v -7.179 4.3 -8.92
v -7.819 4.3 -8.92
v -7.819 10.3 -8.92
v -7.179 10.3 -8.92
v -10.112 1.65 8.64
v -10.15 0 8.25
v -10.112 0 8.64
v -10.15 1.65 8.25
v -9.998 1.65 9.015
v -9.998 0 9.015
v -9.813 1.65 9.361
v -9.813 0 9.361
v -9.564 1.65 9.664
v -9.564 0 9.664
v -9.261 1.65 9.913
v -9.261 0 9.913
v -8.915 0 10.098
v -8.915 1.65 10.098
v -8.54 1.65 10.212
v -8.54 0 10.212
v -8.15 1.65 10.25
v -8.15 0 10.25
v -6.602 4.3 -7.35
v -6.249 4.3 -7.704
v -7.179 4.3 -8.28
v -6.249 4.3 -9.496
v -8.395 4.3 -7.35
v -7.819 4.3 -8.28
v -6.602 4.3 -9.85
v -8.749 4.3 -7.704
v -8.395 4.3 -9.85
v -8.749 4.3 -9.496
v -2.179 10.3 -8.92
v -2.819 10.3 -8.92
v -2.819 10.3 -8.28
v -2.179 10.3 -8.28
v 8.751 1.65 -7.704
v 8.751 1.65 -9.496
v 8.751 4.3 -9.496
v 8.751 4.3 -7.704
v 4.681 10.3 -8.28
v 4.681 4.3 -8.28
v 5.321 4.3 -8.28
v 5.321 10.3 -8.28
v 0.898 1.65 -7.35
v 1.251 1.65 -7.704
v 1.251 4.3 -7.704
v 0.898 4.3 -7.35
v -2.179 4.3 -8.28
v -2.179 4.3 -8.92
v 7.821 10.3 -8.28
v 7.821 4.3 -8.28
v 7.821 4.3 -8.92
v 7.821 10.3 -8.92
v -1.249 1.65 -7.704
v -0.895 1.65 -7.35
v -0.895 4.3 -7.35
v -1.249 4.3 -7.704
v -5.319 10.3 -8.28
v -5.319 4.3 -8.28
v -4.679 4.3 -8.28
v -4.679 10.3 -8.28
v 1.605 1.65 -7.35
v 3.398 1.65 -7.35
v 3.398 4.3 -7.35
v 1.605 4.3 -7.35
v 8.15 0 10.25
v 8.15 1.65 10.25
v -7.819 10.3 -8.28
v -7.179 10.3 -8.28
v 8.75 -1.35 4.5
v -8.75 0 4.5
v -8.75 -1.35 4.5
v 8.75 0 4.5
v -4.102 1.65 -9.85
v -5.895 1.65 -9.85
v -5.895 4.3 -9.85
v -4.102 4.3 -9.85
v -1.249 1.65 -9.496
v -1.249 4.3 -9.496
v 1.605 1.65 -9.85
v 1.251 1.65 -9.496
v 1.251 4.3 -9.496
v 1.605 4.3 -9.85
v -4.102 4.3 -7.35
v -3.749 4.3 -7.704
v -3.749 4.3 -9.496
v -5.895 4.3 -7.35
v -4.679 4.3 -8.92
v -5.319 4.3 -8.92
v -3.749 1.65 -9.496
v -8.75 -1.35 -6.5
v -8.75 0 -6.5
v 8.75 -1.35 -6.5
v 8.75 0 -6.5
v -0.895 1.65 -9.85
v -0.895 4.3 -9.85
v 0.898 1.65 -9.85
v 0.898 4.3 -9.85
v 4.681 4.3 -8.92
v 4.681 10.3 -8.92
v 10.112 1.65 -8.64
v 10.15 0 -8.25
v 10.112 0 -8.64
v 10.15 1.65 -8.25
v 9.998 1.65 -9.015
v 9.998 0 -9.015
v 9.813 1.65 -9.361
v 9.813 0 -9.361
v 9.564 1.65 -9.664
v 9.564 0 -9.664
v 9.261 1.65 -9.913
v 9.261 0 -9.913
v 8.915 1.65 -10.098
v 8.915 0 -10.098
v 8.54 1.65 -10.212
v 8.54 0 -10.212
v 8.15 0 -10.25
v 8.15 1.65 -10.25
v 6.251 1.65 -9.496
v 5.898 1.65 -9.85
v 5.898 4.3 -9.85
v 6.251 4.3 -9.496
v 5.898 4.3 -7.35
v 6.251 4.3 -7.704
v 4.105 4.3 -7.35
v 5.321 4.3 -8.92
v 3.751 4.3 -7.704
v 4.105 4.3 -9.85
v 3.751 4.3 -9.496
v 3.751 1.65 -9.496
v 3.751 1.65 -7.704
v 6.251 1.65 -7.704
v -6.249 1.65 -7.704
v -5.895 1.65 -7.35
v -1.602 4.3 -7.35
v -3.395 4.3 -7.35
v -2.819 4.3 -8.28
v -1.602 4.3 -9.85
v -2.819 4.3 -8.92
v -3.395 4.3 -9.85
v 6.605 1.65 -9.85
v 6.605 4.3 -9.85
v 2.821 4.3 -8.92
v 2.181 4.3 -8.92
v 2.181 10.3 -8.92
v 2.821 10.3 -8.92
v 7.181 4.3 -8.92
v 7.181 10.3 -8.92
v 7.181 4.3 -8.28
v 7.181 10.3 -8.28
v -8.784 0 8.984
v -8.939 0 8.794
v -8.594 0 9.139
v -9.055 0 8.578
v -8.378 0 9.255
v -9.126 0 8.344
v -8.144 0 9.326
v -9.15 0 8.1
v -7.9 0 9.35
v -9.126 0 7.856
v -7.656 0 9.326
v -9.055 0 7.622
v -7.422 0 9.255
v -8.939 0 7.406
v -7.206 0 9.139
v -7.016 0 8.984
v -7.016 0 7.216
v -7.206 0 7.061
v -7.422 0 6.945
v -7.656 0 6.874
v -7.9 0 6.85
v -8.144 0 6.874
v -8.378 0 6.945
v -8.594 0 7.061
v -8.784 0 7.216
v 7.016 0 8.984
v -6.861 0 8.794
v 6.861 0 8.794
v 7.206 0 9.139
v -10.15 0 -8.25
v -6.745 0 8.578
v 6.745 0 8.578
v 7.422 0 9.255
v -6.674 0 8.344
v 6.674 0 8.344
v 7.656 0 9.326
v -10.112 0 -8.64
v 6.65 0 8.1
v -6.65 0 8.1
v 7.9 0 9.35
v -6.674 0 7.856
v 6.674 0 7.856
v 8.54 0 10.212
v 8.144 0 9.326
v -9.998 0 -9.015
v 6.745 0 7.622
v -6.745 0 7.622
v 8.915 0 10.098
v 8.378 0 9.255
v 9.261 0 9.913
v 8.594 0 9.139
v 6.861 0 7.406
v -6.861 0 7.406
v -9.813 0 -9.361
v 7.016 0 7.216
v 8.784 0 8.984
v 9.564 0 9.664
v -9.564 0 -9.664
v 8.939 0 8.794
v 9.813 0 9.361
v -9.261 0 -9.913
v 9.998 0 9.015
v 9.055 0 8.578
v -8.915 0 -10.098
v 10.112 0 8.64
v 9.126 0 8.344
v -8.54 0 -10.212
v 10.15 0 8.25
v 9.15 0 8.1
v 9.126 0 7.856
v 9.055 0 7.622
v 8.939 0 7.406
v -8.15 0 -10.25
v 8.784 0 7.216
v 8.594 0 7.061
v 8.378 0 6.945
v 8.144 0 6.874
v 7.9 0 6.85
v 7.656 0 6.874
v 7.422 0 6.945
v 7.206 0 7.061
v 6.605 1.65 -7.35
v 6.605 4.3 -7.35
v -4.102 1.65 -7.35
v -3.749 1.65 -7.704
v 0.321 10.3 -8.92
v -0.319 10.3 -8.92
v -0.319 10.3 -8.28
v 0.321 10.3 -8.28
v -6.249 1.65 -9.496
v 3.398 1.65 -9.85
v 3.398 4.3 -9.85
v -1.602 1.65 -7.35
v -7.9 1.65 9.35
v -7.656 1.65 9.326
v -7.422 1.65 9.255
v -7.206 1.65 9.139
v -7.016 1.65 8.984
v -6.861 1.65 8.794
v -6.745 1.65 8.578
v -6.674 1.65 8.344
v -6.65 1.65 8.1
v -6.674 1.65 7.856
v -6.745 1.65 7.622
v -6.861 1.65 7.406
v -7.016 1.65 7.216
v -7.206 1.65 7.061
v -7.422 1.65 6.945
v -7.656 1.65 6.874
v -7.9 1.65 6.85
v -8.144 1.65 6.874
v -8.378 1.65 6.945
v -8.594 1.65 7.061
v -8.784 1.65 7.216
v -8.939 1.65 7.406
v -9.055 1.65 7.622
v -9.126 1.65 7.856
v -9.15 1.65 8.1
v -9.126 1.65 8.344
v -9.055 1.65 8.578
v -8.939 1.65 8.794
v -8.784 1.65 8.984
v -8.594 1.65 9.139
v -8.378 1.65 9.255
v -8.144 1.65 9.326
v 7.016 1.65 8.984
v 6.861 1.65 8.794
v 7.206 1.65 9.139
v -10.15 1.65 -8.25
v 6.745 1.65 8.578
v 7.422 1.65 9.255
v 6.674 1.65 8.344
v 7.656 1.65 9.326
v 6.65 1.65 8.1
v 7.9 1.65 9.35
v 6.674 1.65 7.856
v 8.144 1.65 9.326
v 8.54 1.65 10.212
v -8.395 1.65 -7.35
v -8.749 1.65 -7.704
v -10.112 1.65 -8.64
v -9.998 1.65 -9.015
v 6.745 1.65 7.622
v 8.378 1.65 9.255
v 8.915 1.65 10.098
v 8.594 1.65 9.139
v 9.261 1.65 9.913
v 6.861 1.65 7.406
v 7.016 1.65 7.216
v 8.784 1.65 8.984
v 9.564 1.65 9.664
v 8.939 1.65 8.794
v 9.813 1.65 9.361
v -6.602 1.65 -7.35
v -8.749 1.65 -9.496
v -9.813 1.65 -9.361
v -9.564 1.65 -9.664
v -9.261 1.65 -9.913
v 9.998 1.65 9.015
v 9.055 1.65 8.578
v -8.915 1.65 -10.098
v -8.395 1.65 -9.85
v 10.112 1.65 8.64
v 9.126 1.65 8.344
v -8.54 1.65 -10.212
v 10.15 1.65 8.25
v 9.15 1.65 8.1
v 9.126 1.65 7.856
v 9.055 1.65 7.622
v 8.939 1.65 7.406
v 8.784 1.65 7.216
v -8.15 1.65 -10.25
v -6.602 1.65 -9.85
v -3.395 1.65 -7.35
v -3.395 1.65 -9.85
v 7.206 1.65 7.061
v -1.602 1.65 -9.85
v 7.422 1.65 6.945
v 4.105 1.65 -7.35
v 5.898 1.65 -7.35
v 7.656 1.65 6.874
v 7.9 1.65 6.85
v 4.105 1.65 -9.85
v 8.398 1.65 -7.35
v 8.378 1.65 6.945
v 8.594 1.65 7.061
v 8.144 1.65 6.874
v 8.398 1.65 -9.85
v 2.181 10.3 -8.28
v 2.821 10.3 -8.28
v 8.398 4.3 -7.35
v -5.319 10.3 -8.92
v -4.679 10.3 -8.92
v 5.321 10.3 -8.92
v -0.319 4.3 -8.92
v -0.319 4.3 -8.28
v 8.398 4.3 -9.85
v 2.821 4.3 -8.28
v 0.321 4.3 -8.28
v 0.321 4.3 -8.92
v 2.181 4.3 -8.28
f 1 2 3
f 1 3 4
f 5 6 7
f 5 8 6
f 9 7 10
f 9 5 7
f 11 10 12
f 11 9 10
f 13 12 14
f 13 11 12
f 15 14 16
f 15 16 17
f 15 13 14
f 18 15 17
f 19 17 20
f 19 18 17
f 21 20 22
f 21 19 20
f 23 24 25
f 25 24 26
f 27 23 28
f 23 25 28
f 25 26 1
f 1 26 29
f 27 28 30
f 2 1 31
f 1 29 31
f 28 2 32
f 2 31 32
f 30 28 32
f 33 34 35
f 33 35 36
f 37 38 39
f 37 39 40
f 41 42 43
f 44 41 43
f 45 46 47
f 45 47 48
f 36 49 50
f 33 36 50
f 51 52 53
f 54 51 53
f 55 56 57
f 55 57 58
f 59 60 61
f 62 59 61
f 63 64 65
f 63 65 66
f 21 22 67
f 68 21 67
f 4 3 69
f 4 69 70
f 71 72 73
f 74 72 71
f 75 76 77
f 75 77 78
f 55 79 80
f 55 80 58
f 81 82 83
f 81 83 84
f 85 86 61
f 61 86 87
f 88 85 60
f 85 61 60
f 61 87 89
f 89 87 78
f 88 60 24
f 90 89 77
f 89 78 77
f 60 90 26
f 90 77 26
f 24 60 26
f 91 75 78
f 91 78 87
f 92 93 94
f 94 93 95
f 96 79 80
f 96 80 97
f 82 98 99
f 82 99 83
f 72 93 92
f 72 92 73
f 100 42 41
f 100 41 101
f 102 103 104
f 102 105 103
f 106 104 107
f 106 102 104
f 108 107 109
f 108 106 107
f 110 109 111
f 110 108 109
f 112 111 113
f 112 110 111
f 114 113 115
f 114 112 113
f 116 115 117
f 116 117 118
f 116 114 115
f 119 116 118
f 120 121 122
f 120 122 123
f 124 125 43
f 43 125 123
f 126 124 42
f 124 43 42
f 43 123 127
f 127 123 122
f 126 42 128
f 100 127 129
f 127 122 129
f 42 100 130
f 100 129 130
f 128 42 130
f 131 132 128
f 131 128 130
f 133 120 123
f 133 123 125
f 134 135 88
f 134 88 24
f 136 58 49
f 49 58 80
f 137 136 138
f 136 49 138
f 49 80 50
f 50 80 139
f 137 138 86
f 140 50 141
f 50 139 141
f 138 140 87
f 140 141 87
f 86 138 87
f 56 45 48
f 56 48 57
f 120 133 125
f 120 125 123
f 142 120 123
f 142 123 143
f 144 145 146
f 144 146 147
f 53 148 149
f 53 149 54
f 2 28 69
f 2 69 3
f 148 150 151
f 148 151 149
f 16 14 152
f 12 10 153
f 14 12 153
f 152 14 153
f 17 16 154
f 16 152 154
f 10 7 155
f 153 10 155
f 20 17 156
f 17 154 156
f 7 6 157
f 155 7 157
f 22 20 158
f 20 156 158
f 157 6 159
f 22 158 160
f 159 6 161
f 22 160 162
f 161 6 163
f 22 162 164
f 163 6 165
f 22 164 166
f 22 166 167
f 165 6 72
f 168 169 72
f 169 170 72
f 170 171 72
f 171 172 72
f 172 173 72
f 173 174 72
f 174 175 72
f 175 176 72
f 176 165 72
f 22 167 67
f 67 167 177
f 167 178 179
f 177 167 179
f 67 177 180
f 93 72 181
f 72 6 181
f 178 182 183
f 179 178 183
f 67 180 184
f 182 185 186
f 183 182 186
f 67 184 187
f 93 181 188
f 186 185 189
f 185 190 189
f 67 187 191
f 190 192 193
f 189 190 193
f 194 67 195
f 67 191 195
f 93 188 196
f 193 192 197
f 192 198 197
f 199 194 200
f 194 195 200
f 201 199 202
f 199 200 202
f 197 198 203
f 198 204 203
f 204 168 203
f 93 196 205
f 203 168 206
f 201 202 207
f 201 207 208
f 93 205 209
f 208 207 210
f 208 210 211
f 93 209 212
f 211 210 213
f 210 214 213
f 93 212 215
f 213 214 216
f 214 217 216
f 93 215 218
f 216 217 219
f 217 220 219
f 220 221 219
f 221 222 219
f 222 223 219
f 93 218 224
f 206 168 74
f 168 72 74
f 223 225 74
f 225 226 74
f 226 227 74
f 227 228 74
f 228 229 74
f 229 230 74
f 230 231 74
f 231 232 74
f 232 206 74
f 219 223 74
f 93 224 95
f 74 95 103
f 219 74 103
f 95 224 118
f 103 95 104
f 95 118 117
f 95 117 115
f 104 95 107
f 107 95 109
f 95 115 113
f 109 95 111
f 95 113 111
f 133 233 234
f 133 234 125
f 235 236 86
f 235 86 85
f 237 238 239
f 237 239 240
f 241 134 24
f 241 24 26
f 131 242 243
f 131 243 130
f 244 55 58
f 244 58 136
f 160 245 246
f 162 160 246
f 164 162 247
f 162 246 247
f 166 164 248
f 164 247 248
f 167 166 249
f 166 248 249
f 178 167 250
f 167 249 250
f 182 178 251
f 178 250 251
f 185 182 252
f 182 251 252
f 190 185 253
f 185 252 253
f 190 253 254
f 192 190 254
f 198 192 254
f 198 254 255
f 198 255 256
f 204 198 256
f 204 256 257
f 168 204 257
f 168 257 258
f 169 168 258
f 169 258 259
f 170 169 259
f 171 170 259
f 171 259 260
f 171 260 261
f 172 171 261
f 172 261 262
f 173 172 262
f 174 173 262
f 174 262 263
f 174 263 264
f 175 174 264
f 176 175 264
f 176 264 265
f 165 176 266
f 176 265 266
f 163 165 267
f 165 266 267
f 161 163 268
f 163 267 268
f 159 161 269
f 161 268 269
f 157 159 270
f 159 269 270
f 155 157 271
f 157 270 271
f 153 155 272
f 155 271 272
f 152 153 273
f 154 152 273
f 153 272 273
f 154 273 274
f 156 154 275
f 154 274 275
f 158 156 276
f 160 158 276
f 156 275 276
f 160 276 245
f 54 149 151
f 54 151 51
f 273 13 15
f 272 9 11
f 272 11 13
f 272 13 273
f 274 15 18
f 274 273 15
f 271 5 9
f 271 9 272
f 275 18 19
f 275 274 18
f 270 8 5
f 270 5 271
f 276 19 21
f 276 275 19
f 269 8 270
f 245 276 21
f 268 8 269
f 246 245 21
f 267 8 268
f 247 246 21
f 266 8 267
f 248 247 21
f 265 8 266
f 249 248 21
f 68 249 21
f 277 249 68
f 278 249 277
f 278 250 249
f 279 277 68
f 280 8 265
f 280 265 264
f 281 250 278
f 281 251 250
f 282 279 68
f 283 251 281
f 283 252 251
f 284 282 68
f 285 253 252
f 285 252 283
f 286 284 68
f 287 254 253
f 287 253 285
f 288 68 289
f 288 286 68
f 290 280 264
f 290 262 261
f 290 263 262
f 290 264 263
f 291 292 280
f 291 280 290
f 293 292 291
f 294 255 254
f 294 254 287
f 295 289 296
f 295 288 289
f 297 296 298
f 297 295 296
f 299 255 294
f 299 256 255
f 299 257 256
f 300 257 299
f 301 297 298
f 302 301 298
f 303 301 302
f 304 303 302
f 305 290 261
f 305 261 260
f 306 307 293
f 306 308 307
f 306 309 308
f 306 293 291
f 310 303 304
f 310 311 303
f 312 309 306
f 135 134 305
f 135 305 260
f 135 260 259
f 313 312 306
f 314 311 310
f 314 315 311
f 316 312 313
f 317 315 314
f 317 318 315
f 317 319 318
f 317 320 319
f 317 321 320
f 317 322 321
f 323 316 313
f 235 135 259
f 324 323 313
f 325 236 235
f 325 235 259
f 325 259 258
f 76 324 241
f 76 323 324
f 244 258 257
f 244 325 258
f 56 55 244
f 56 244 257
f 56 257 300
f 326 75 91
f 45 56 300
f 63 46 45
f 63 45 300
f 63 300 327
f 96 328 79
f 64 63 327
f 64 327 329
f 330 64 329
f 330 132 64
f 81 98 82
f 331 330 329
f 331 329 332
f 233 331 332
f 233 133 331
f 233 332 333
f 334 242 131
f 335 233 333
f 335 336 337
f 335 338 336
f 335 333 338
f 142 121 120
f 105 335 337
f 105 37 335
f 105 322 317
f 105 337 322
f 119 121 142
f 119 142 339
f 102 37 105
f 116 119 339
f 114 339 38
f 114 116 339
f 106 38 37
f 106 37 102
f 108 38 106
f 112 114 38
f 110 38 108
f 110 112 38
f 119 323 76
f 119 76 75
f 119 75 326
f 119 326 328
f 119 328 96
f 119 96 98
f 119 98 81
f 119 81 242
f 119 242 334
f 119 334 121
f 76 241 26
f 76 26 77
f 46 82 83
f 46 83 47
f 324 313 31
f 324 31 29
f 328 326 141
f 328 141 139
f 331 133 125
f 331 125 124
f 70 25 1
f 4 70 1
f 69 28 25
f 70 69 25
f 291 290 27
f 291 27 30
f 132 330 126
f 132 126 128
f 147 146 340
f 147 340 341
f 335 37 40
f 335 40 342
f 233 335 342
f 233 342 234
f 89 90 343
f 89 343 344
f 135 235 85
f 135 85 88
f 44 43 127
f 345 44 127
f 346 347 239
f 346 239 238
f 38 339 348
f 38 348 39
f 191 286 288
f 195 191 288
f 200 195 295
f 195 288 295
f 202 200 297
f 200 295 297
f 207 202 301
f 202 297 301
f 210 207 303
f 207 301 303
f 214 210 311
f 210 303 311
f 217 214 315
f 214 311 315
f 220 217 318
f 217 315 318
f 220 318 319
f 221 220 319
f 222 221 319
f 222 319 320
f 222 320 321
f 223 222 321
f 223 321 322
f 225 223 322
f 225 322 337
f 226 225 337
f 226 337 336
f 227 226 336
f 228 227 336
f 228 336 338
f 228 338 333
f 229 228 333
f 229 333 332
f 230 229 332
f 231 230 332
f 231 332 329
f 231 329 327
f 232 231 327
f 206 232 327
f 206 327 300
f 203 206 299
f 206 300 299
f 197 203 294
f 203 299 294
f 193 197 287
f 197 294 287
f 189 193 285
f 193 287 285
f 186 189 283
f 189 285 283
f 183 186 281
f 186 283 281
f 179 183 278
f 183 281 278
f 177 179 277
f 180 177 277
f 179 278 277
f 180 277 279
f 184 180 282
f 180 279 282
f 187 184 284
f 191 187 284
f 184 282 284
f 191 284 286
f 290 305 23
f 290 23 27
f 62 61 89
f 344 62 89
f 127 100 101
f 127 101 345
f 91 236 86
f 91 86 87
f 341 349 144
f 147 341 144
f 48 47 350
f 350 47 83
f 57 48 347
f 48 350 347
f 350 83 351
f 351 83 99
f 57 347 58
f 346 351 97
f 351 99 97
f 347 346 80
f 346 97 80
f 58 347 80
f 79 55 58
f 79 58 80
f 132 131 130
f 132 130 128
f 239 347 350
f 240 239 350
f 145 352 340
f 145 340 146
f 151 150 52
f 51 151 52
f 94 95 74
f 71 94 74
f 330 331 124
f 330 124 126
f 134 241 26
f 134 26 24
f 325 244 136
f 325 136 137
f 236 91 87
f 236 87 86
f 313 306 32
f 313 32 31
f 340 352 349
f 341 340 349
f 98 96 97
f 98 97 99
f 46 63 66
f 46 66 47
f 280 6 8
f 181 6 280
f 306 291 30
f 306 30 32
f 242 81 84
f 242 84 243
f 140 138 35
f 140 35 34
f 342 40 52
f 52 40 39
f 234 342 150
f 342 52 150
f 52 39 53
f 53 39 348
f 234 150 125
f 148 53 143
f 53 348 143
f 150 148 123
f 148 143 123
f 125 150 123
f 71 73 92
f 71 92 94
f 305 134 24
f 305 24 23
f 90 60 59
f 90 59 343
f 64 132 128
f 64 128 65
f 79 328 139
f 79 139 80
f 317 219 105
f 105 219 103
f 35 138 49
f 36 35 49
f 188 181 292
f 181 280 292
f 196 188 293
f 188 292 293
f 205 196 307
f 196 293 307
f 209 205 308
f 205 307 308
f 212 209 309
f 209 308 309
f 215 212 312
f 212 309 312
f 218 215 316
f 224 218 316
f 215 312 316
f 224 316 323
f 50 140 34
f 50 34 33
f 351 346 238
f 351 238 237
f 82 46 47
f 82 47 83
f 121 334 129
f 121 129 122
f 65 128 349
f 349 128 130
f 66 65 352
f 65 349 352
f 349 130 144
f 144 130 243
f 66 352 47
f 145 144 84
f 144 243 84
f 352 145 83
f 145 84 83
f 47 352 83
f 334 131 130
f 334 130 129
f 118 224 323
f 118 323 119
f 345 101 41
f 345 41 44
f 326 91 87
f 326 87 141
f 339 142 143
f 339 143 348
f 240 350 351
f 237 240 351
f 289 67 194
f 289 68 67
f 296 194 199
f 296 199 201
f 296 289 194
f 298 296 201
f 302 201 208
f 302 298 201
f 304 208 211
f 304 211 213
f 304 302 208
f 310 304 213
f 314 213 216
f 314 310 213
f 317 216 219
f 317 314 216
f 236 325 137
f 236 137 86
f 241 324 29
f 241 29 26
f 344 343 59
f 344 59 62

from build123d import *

# Parameters (mm, degrees)
SKETCH1_W           = 20.3
SKETCH1_H           = 20.5
BOSS_EXTRUDE1_DEPTH = 1.65
FILLET1_R           = 2
SKETCH2_R           = 1.25
CUT_EXTRUDE1_DEPTH  = 15.519211411
BOSS_EXTRUDE2_DEPTH = 2.65
SKETCH4_W           = 0.64
SKETCH4_H           = 0.64
BOSS_EXTRUDE3_DEPTH = 6
LPATTERN1_COUNT     = 7
LPATTERN1_PITCH     = 2.5
SKETCH5_W           = 17.5
SKETCH5_H           = 11
BOSS_EXTRUDE4_DEPTH = 1.35


with BuildPart() as part:
    # Sketch1 → Boss-Extrude1 (new body)
    with BuildSketch(Plane(origin=(0, 0, 0), x_dir=(1, 0, 0), z_dir=(0, 1, 0))):
        Rectangle(SKETCH1_W, SKETCH1_H)
    extrude(amount=BOSS_EXTRUDE1_DEPTH)

    # Fillet1
    fillet1_edges = [part.edges().sort_by_distance(p)[0] for p in [
        (10.15, 0.825, 10.25),
        (-10.15, 0.825, 10.25),
        (-10.15, 0.825, -10.25),
        (10.15, 0.825, -10.25),
    ]]
    fillet(fillet1_edges, radius=FILLET1_R)

    # Sketch2 → Cut-Extrude1 (cut, through all)
    with BuildSketch(Plane(origin=(0, 1.65, 0), x_dir=(1, 0, 0), z_dir=(0, 1, 0))):
        with Locations(Location((7.9, -8.1, 0), (0, 0, 270))):
            Circle(SKETCH2_R)
        with Locations(Location((-7.9, -8.1, 0), (0, 0, 270))):
            Circle(SKETCH2_R)
    extrude(amount=-CUT_EXTRUDE1_DEPTH, mode=Mode.SUBTRACT)

    # Sketch3 → Boss-Extrude2 (add)
    with BuildSketch(Plane(origin=(0, 1.65, 0), x_dir=(1, 0, 0), z_dir=(0, 1, 0))):
        Polygon((-8.395, 9.85), (-6.602128422, 9.85), (-6.248596673, 9.496424969), (-6.248596673, 7.703553391), (-6.602150064, 7.35), (-8.395021642, 7.35), (-8.748553391, 7.703575031), (-8.748553391, 9.496446609), align=None)
    boss_extrude2 = extrude(amount=BOSS_EXTRUDE2_DEPTH)

    # Sketch4 → Boss-Extrude3 (add)
    with BuildSketch(Plane(origin=(0, 4.3, 0), x_dir=(1, 0, 0), z_dir=(0, 1, 0))):
        with Locations((-7.498564211, 8.60001082)):
            Rectangle(SKETCH4_W, SKETCH4_H)
    boss_extrude3 = extrude(amount=BOSS_EXTRUDE3_DEPTH)

    # LPattern1: Boss-Extrude2, Boss-Extrude3 ×7
    with Locations(*[(i * LPATTERN1_PITCH, 0, 0) for i in range(1, LPATTERN1_COUNT)]):
        add(boss_extrude2)
        add(boss_extrude3)

    # Sketch5 → Boss-Extrude4 (add)
    with BuildSketch(Plane.XZ):
        with Locations((0, -1)):
            Rectangle(SKETCH5_W, SKETCH5_H)
    extrude(amount=BOSS_EXTRUDE4_DEPTH)


solid = part.part
